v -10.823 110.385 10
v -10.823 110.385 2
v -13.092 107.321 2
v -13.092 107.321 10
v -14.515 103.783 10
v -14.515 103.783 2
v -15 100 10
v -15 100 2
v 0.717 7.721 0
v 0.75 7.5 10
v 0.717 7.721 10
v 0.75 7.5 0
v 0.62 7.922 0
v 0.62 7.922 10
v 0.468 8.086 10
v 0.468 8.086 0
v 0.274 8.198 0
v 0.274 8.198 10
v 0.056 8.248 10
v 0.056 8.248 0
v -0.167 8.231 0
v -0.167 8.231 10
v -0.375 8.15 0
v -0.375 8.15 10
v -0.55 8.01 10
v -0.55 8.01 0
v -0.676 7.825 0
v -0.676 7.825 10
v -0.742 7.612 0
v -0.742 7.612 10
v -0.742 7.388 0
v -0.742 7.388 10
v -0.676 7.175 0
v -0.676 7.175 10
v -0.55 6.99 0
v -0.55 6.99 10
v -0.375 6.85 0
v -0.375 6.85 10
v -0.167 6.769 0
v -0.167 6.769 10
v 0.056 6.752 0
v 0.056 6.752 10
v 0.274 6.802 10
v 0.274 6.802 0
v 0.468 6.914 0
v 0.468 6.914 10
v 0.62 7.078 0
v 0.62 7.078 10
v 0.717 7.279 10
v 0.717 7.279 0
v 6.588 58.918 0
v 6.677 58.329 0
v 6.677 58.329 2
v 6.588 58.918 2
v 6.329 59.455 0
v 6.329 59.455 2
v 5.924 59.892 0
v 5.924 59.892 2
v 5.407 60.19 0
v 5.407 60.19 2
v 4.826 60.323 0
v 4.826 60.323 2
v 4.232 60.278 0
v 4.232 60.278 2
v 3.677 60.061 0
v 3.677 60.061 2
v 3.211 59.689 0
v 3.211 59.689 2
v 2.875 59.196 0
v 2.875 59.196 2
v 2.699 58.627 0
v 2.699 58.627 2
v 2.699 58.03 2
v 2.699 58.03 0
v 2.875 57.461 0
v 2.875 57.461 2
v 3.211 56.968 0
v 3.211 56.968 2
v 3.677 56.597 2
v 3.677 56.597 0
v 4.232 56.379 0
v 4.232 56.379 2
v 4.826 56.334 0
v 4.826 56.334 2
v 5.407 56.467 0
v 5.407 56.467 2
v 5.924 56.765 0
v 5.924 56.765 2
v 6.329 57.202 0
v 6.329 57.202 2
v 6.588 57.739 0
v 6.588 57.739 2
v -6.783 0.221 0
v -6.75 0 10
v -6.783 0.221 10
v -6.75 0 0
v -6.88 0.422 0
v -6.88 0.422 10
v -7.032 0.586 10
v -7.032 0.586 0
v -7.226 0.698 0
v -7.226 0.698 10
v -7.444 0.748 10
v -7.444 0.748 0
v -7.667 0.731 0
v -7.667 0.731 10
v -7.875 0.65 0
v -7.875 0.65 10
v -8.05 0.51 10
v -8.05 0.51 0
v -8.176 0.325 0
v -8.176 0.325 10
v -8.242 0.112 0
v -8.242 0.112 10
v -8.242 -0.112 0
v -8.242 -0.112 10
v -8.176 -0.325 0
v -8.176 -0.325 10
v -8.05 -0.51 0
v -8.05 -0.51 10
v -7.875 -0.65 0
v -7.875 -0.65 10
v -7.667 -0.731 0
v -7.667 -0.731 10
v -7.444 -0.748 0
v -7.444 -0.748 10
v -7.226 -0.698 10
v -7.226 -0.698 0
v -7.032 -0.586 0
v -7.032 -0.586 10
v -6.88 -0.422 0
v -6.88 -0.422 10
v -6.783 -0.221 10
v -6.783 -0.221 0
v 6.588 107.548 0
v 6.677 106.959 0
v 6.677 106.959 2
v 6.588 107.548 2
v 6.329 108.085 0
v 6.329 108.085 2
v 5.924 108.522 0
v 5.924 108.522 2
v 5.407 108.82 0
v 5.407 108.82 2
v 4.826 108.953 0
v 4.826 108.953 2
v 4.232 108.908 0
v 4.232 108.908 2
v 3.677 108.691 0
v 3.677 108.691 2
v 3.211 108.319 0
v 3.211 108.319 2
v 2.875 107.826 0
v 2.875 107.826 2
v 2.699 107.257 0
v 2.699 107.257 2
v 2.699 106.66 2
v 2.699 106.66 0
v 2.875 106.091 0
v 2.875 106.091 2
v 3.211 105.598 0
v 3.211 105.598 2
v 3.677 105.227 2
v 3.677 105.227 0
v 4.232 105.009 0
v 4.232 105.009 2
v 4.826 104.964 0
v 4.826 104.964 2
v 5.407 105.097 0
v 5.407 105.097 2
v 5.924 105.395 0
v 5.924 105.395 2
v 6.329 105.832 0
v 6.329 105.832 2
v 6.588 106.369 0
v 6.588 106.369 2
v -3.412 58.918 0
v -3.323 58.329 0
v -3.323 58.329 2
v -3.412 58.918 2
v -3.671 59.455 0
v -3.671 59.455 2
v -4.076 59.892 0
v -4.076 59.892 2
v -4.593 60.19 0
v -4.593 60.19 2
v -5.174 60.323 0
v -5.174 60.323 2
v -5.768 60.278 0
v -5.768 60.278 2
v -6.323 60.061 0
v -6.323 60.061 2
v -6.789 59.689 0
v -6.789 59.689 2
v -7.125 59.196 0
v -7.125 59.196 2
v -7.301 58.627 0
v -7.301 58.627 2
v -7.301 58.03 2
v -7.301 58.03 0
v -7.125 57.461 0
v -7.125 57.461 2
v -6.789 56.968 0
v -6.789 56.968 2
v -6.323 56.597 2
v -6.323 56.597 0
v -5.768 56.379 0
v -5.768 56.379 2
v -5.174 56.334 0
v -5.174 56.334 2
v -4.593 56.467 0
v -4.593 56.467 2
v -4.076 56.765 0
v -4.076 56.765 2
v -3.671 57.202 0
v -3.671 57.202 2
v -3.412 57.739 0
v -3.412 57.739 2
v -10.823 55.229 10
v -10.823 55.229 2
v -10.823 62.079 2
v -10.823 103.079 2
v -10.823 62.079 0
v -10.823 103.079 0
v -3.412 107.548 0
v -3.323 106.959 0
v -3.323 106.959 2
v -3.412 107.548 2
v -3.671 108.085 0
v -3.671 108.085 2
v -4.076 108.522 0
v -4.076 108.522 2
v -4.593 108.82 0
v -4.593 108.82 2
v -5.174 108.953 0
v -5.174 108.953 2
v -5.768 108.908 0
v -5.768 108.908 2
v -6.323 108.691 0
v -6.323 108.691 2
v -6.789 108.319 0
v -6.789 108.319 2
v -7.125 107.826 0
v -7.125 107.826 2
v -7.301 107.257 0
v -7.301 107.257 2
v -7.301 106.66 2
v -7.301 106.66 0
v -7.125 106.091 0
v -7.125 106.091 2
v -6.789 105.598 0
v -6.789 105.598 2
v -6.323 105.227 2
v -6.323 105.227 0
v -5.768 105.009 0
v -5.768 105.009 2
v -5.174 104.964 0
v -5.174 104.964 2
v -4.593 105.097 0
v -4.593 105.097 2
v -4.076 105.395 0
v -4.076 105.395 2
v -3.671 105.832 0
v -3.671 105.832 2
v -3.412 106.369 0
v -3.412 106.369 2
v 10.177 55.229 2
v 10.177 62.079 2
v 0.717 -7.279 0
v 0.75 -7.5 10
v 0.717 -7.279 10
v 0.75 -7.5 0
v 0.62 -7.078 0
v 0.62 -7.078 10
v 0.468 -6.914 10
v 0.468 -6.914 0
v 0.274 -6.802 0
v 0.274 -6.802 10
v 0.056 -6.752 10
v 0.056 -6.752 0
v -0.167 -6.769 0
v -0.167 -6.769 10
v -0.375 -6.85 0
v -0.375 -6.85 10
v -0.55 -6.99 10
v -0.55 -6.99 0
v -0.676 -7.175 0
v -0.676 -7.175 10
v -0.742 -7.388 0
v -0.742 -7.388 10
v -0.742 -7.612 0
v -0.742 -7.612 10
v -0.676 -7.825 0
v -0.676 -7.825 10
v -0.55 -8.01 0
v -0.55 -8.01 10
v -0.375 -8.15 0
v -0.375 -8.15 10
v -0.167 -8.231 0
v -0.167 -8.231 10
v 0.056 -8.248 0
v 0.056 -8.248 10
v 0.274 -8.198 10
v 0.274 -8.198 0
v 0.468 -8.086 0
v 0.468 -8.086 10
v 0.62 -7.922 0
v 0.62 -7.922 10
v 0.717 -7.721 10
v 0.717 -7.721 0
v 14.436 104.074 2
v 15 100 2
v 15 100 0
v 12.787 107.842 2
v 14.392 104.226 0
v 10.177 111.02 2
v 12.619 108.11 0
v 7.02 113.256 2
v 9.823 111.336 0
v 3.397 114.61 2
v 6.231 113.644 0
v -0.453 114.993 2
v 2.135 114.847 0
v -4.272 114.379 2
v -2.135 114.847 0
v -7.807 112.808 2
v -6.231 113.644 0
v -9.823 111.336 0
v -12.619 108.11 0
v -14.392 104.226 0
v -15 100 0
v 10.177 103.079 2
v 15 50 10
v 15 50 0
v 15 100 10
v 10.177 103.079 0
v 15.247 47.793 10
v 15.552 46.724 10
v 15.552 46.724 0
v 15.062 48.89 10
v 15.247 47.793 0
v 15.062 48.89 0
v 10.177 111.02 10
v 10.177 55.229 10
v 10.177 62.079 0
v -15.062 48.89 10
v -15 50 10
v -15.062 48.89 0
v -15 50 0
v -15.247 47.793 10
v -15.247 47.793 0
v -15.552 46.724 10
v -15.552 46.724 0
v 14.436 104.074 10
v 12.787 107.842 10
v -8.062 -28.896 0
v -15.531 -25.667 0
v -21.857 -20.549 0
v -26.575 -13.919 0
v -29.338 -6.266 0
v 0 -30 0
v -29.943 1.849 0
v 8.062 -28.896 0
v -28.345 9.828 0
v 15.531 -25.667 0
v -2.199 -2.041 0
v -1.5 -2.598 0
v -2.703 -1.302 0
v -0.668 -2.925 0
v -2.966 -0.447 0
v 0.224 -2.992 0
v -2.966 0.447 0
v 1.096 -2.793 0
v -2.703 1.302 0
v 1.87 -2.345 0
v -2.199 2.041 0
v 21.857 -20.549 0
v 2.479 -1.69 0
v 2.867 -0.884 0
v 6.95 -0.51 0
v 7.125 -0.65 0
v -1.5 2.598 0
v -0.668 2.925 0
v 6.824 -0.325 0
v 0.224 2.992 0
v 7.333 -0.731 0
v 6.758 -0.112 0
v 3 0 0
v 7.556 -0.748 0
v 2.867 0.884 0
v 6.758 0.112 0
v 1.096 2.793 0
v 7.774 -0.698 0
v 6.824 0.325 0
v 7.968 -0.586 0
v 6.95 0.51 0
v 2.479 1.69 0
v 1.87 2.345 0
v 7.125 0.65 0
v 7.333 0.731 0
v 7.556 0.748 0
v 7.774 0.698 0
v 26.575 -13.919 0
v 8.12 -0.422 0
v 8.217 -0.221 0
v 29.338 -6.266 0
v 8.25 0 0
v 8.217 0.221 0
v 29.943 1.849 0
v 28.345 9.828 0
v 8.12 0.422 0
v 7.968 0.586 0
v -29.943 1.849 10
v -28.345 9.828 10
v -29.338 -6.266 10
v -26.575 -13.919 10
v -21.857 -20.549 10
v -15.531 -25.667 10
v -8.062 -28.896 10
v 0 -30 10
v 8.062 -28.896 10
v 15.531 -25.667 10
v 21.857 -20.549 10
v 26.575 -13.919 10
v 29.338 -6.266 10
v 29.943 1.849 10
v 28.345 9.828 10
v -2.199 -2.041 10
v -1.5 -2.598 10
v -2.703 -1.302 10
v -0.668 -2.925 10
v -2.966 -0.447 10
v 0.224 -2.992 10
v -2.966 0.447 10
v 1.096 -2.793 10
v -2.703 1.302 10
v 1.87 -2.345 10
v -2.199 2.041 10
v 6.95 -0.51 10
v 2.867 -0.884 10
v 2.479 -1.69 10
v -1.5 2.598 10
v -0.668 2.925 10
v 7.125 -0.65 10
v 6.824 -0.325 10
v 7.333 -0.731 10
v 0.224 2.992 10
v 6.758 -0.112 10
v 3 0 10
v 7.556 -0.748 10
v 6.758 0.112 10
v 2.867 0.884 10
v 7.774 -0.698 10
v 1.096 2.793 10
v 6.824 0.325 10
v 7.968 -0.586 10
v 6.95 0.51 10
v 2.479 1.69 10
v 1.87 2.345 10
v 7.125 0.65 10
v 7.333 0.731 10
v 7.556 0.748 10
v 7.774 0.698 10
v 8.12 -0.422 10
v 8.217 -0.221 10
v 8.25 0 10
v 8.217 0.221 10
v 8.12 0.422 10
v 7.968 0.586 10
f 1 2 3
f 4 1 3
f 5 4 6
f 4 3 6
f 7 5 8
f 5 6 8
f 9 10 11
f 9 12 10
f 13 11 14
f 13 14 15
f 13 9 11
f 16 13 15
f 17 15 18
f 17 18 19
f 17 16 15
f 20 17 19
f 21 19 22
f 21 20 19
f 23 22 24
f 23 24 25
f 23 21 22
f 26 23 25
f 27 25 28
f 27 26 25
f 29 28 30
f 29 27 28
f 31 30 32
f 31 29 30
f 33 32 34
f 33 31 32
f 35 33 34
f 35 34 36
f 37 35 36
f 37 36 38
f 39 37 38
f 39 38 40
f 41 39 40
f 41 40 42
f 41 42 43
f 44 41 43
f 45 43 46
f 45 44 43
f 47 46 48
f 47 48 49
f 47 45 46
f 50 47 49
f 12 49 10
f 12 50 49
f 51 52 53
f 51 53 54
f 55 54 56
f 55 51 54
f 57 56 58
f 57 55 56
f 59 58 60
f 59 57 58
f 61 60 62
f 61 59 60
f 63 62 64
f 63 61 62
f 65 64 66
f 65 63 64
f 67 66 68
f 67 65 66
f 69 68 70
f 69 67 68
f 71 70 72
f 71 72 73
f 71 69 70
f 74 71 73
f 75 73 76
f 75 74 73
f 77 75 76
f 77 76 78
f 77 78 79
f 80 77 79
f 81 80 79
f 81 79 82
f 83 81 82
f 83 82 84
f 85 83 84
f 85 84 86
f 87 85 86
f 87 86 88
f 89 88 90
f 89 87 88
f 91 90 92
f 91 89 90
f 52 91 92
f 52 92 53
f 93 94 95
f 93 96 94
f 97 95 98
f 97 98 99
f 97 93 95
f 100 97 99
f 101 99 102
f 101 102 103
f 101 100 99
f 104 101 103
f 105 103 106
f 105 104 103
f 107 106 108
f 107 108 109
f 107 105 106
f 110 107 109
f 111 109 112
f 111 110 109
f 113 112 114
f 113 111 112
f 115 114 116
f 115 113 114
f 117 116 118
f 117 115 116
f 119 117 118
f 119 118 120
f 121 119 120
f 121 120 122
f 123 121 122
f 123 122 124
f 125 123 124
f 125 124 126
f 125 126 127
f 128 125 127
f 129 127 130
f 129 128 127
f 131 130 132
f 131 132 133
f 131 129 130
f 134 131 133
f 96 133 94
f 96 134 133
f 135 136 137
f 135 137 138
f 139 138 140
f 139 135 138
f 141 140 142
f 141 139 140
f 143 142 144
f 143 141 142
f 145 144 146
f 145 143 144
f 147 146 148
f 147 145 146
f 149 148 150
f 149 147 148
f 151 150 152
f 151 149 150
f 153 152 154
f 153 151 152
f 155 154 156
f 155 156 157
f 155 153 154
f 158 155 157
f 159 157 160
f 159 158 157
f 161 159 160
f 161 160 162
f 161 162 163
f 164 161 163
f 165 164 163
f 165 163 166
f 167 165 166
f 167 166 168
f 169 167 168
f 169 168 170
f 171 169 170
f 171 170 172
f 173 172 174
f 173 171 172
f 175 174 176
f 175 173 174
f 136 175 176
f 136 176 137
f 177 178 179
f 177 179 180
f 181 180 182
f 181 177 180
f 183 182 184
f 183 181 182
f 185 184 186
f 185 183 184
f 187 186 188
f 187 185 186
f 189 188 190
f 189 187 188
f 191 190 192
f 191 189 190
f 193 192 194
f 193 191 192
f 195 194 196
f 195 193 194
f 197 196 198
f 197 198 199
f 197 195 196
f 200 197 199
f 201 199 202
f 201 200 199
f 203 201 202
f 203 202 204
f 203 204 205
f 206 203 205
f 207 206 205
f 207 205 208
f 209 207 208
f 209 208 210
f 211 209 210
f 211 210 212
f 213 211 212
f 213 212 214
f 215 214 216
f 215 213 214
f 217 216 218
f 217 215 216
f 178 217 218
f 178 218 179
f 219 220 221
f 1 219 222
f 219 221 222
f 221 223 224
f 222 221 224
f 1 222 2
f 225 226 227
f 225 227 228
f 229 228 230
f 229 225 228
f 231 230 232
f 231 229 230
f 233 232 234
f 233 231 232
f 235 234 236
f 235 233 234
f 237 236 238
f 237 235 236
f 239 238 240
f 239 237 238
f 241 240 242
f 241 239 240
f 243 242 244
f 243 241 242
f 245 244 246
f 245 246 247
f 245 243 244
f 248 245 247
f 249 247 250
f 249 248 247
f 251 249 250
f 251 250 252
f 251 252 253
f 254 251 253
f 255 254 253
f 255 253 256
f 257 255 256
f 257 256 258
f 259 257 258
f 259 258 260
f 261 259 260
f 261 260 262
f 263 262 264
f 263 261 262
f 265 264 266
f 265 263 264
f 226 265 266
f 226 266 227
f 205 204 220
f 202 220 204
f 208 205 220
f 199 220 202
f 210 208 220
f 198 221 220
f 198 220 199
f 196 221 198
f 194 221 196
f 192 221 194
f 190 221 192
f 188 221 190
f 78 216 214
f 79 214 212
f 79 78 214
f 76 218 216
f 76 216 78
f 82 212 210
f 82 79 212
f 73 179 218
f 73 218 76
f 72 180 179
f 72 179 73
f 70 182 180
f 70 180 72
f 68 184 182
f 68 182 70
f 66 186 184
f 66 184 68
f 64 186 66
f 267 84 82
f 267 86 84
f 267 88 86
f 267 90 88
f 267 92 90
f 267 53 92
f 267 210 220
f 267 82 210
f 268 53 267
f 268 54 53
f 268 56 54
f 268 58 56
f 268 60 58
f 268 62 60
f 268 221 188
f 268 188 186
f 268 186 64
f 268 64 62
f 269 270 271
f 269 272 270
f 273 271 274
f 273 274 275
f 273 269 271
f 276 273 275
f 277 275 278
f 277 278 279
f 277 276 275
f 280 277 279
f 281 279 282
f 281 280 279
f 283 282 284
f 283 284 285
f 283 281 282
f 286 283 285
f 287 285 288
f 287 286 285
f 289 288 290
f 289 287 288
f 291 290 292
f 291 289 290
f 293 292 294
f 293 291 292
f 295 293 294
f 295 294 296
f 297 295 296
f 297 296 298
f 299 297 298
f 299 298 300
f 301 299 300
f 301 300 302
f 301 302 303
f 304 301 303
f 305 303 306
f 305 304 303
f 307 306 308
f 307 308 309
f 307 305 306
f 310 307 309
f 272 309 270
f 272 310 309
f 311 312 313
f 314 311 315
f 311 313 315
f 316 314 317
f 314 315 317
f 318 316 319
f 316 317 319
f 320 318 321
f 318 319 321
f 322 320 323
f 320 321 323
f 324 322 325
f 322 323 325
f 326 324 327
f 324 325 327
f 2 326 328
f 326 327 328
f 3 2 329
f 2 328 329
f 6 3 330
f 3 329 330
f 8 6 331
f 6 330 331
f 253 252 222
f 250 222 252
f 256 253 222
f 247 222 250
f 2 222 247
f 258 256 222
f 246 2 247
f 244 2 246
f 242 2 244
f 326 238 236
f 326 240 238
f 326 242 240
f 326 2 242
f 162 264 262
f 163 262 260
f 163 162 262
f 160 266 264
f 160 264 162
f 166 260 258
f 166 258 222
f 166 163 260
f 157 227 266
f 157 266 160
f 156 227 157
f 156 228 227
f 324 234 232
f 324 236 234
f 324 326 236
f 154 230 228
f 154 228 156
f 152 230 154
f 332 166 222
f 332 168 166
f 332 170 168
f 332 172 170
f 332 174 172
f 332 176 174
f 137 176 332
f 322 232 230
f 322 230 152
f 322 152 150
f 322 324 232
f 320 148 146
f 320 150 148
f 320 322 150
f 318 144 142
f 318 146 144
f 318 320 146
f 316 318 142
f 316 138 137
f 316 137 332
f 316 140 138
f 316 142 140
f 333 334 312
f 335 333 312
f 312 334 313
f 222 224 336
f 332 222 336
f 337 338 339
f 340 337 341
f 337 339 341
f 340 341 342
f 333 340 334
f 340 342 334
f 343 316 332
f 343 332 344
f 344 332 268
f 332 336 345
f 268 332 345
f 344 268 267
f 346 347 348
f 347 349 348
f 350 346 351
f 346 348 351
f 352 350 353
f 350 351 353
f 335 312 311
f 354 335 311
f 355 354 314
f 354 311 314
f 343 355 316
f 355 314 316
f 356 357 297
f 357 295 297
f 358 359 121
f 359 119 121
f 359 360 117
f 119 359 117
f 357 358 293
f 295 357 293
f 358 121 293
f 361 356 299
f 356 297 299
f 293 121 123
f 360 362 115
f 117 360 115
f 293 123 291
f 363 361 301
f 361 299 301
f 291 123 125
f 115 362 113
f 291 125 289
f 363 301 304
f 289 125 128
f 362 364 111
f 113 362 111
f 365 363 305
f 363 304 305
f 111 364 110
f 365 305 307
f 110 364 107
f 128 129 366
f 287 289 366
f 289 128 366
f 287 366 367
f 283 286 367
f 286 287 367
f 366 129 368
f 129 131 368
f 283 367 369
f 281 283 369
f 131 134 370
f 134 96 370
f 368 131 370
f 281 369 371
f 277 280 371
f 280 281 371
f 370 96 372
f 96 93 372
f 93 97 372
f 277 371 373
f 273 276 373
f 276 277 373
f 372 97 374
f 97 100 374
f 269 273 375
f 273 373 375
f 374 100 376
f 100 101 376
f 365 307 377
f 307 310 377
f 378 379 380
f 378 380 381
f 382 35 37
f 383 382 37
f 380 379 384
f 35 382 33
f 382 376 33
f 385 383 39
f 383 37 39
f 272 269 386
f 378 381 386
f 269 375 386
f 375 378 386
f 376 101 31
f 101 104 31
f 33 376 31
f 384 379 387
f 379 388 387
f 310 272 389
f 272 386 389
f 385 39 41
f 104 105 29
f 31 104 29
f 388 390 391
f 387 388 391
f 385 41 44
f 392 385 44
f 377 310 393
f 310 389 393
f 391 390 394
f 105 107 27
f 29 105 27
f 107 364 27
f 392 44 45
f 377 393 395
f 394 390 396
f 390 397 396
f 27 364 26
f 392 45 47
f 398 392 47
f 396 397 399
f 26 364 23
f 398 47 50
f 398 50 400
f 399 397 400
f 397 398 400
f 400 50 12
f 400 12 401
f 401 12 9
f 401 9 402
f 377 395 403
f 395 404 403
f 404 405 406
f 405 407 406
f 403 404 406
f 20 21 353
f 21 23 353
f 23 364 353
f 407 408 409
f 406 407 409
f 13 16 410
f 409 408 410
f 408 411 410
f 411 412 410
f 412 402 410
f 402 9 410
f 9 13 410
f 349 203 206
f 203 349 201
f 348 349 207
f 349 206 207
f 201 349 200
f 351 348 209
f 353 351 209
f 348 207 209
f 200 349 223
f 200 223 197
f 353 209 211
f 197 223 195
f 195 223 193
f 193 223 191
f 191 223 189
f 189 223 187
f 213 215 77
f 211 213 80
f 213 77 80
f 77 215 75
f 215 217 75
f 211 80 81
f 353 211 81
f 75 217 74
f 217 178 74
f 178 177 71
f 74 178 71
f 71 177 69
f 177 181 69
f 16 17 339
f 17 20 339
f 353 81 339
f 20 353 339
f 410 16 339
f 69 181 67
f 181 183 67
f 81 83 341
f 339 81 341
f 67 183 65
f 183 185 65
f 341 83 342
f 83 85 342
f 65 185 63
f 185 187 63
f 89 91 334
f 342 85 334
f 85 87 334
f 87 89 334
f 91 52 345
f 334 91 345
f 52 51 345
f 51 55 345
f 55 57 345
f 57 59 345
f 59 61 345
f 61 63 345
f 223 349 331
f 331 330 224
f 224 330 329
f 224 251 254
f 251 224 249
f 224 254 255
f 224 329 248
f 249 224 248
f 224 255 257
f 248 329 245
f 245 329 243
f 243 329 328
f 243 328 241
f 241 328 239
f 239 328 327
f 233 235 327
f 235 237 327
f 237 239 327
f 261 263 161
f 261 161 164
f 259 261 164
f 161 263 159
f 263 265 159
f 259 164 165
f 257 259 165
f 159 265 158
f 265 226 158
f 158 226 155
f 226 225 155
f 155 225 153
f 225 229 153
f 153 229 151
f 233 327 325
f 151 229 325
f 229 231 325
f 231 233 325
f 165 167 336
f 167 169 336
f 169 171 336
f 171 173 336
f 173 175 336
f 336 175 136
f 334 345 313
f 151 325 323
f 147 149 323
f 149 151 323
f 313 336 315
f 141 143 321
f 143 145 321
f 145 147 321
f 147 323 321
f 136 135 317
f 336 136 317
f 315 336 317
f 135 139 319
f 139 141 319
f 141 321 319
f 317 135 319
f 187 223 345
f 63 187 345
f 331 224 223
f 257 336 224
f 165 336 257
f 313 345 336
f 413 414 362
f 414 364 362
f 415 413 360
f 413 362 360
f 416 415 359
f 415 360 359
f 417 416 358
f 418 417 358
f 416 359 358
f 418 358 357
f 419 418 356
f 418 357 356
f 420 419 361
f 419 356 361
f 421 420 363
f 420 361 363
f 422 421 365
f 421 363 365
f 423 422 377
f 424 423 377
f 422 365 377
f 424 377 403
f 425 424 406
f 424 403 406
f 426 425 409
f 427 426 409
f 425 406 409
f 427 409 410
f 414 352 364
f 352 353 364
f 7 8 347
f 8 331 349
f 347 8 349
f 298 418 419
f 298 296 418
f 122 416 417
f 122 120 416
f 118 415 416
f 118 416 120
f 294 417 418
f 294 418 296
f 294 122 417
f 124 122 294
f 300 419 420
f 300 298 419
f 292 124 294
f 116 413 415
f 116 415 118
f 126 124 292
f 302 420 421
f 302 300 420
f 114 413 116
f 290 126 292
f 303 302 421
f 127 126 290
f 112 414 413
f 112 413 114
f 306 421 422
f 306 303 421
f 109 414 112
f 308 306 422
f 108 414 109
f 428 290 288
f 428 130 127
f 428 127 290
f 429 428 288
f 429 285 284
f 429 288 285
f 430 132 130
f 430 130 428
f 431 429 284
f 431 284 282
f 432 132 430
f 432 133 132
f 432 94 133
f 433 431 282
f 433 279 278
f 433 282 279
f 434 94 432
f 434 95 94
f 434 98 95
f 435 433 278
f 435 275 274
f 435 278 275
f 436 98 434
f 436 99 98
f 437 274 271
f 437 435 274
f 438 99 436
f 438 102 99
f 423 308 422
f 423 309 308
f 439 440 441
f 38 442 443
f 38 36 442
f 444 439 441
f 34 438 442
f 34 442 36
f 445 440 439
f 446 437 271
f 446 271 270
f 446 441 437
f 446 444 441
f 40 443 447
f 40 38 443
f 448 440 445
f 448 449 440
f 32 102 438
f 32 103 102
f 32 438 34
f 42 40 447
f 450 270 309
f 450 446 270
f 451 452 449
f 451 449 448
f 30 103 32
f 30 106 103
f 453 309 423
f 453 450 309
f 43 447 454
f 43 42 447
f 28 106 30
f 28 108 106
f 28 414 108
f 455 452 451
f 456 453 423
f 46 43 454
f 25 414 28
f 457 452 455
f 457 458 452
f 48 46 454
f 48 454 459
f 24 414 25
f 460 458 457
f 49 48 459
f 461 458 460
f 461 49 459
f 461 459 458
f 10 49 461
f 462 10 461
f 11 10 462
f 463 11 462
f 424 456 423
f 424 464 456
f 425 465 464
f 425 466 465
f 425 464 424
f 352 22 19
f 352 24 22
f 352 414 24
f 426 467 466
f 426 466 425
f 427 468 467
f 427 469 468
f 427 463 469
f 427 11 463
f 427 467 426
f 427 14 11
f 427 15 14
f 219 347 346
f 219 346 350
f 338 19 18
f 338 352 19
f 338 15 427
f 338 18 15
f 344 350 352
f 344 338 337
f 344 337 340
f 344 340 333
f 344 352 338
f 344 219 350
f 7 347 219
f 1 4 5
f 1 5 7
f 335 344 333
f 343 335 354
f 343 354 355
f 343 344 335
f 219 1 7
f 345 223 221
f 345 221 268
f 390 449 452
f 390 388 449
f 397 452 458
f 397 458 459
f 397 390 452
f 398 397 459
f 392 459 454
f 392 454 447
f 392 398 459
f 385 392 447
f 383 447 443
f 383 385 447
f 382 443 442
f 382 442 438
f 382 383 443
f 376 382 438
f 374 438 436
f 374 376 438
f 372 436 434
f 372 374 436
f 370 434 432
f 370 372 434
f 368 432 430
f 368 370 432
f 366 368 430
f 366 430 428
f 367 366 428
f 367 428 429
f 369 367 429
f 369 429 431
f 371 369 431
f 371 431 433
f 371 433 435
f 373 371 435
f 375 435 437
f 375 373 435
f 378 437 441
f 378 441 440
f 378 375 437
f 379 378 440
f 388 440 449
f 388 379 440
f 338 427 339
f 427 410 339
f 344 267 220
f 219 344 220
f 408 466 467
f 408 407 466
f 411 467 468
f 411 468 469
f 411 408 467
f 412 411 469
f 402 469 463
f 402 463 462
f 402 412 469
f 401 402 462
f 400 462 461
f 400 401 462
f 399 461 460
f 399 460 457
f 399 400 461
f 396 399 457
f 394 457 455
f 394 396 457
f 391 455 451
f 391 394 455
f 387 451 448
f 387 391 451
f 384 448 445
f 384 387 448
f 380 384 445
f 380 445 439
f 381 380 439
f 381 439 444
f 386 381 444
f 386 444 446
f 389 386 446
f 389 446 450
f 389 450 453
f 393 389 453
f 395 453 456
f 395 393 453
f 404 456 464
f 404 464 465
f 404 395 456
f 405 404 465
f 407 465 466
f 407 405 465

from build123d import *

# Parameters (mm, degrees)
ESQUISSE1_W        = 21
ESQUISSE1_H        = 41
ESQUISSE1_R        = 0.75
ESQUISSE1_R_2      = 2
ESQUISSE1_R_3      = 3
BOSS_EXTRU_1_DEPTH = 2
BOSS_EXTRU_2_START = 2
ESQUISSE1_3_R      = 0.75
ESQUISSE1_3_R_2    = 3
BOSS_EXTRU_2_DEPTH = 8


with BuildPart() as part:
    # Esquisse1 → Boss.-Extru.1 (new body)
    with BuildSketch(Plane.XY):
        with BuildLine():
            Line((-15, 100), (-15, 50))
            ThreePointArc((-15, 50), (-15.138914933, 48.338975829), (-15.551800259, 46.72409987))
            Line((-15.551800259, 46.72409987), (-28.344599222, 9.827700389))
            ThreePointArc((-28.344599222, 9.827700389), (0, -30), (28.344599222, 9.827700389))
            Line((28.344599222, 9.827700389), (15.551800259, 46.72409987))
            ThreePointArc((15.551800259, 46.72409987), (15.138914933, 48.338975829), (15, 50))
            Line((15, 50), (15, 100))
            ThreePointArc((15, 100), (0, 115), (-15, 100))
        make_face()
        with Locations((-0.323225061, 82.579304785)):
            Rectangle(ESQUISSE1_W, ESQUISSE1_H, mode=Mode.SUBTRACT)
        with Locations((0, -7.5)):
            Circle(ESQUISSE1_R, mode=Mode.SUBTRACT)
        with Locations((-7.5, 0)):
            Circle(ESQUISSE1_R, mode=Mode.SUBTRACT)
        with Locations((0, 7.5)):
            Circle(ESQUISSE1_R, mode=Mode.SUBTRACT)
        with Locations((7.5, 0)):
            Circle(ESQUISSE1_R, mode=Mode.SUBTRACT)
        with Locations((4.676774939, 106.958577425)):
            Circle(ESQUISSE1_R_2, mode=Mode.SUBTRACT)
        with Locations((-5.323225061, 106.958577425)):
            Circle(ESQUISSE1_R_2, mode=Mode.SUBTRACT)
        with Locations((4.676774939, 58.328577425)):
            Circle(ESQUISSE1_R_2, mode=Mode.SUBTRACT)
        with Locations((-5.323225061, 58.328577425)):
            Circle(ESQUISSE1_R_2, mode=Mode.SUBTRACT)
        Circle(ESQUISSE1_R_3, mode=Mode.SUBTRACT)
    extrude(amount=BOSS_EXTRU_1_DEPTH)

    # Esquisse1<3> → Boss.-Extru.2 (add)
    with BuildSketch(Plane.XY.offset(BOSS_EXTRU_2_START)):
        with BuildLine():
            ThreePointArc((-10.823225061, 110.385460957), (-13.916687392, 105.596946672), (-15, 100))
            Line((-15, 100), (-15, 50))
            ThreePointArc((-15, 50), (-15.138914933, 48.338975829), (-15.551800259, 46.72409987))
            Line((-15.551800259, 46.72409987), (-28.344599222, 9.827700389))
            ThreePointArc((-28.344599222, 9.827700389), (0, -30), (28.344599222, 9.827700389))
            Line((28.344599222, 9.827700389), (15.551800259, 46.72409987))
            ThreePointArc((15.551800259, 46.72409987), (15.138914933, 48.338975829), (15, 50))
            Line((15, 50), (15, 100))
            ThreePointArc((15, 100), (13.74139047, 106.014498147), (10.176774939, 111.019675668))
            Line((10.176774939, 111.019675668), (10.176774939, 55.229304785))
            Line((10.176774939, 55.229304785), (-10.823225061, 55.229304785))
            Line((-10.823225061, 55.229304785), (-10.823225061, 110.385460957))
        make_face()
        with Locations((0, -7.5)):
            Circle(ESQUISSE1_3_R, mode=Mode.SUBTRACT)
        with Locations((7.5, 0)):
            Circle(ESQUISSE1_3_R, mode=Mode.SUBTRACT)
        with Locations((0, 7.5)):
            Circle(ESQUISSE1_3_R, mode=Mode.SUBTRACT)
        with Locations((-7.5, 0)):
            Circle(ESQUISSE1_3_R, mode=Mode.SUBTRACT)
        Circle(ESQUISSE1_3_R_2, mode=Mode.SUBTRACT)
    extrude(amount=BOSS_EXTRU_2_DEPTH)


solid = part.part
